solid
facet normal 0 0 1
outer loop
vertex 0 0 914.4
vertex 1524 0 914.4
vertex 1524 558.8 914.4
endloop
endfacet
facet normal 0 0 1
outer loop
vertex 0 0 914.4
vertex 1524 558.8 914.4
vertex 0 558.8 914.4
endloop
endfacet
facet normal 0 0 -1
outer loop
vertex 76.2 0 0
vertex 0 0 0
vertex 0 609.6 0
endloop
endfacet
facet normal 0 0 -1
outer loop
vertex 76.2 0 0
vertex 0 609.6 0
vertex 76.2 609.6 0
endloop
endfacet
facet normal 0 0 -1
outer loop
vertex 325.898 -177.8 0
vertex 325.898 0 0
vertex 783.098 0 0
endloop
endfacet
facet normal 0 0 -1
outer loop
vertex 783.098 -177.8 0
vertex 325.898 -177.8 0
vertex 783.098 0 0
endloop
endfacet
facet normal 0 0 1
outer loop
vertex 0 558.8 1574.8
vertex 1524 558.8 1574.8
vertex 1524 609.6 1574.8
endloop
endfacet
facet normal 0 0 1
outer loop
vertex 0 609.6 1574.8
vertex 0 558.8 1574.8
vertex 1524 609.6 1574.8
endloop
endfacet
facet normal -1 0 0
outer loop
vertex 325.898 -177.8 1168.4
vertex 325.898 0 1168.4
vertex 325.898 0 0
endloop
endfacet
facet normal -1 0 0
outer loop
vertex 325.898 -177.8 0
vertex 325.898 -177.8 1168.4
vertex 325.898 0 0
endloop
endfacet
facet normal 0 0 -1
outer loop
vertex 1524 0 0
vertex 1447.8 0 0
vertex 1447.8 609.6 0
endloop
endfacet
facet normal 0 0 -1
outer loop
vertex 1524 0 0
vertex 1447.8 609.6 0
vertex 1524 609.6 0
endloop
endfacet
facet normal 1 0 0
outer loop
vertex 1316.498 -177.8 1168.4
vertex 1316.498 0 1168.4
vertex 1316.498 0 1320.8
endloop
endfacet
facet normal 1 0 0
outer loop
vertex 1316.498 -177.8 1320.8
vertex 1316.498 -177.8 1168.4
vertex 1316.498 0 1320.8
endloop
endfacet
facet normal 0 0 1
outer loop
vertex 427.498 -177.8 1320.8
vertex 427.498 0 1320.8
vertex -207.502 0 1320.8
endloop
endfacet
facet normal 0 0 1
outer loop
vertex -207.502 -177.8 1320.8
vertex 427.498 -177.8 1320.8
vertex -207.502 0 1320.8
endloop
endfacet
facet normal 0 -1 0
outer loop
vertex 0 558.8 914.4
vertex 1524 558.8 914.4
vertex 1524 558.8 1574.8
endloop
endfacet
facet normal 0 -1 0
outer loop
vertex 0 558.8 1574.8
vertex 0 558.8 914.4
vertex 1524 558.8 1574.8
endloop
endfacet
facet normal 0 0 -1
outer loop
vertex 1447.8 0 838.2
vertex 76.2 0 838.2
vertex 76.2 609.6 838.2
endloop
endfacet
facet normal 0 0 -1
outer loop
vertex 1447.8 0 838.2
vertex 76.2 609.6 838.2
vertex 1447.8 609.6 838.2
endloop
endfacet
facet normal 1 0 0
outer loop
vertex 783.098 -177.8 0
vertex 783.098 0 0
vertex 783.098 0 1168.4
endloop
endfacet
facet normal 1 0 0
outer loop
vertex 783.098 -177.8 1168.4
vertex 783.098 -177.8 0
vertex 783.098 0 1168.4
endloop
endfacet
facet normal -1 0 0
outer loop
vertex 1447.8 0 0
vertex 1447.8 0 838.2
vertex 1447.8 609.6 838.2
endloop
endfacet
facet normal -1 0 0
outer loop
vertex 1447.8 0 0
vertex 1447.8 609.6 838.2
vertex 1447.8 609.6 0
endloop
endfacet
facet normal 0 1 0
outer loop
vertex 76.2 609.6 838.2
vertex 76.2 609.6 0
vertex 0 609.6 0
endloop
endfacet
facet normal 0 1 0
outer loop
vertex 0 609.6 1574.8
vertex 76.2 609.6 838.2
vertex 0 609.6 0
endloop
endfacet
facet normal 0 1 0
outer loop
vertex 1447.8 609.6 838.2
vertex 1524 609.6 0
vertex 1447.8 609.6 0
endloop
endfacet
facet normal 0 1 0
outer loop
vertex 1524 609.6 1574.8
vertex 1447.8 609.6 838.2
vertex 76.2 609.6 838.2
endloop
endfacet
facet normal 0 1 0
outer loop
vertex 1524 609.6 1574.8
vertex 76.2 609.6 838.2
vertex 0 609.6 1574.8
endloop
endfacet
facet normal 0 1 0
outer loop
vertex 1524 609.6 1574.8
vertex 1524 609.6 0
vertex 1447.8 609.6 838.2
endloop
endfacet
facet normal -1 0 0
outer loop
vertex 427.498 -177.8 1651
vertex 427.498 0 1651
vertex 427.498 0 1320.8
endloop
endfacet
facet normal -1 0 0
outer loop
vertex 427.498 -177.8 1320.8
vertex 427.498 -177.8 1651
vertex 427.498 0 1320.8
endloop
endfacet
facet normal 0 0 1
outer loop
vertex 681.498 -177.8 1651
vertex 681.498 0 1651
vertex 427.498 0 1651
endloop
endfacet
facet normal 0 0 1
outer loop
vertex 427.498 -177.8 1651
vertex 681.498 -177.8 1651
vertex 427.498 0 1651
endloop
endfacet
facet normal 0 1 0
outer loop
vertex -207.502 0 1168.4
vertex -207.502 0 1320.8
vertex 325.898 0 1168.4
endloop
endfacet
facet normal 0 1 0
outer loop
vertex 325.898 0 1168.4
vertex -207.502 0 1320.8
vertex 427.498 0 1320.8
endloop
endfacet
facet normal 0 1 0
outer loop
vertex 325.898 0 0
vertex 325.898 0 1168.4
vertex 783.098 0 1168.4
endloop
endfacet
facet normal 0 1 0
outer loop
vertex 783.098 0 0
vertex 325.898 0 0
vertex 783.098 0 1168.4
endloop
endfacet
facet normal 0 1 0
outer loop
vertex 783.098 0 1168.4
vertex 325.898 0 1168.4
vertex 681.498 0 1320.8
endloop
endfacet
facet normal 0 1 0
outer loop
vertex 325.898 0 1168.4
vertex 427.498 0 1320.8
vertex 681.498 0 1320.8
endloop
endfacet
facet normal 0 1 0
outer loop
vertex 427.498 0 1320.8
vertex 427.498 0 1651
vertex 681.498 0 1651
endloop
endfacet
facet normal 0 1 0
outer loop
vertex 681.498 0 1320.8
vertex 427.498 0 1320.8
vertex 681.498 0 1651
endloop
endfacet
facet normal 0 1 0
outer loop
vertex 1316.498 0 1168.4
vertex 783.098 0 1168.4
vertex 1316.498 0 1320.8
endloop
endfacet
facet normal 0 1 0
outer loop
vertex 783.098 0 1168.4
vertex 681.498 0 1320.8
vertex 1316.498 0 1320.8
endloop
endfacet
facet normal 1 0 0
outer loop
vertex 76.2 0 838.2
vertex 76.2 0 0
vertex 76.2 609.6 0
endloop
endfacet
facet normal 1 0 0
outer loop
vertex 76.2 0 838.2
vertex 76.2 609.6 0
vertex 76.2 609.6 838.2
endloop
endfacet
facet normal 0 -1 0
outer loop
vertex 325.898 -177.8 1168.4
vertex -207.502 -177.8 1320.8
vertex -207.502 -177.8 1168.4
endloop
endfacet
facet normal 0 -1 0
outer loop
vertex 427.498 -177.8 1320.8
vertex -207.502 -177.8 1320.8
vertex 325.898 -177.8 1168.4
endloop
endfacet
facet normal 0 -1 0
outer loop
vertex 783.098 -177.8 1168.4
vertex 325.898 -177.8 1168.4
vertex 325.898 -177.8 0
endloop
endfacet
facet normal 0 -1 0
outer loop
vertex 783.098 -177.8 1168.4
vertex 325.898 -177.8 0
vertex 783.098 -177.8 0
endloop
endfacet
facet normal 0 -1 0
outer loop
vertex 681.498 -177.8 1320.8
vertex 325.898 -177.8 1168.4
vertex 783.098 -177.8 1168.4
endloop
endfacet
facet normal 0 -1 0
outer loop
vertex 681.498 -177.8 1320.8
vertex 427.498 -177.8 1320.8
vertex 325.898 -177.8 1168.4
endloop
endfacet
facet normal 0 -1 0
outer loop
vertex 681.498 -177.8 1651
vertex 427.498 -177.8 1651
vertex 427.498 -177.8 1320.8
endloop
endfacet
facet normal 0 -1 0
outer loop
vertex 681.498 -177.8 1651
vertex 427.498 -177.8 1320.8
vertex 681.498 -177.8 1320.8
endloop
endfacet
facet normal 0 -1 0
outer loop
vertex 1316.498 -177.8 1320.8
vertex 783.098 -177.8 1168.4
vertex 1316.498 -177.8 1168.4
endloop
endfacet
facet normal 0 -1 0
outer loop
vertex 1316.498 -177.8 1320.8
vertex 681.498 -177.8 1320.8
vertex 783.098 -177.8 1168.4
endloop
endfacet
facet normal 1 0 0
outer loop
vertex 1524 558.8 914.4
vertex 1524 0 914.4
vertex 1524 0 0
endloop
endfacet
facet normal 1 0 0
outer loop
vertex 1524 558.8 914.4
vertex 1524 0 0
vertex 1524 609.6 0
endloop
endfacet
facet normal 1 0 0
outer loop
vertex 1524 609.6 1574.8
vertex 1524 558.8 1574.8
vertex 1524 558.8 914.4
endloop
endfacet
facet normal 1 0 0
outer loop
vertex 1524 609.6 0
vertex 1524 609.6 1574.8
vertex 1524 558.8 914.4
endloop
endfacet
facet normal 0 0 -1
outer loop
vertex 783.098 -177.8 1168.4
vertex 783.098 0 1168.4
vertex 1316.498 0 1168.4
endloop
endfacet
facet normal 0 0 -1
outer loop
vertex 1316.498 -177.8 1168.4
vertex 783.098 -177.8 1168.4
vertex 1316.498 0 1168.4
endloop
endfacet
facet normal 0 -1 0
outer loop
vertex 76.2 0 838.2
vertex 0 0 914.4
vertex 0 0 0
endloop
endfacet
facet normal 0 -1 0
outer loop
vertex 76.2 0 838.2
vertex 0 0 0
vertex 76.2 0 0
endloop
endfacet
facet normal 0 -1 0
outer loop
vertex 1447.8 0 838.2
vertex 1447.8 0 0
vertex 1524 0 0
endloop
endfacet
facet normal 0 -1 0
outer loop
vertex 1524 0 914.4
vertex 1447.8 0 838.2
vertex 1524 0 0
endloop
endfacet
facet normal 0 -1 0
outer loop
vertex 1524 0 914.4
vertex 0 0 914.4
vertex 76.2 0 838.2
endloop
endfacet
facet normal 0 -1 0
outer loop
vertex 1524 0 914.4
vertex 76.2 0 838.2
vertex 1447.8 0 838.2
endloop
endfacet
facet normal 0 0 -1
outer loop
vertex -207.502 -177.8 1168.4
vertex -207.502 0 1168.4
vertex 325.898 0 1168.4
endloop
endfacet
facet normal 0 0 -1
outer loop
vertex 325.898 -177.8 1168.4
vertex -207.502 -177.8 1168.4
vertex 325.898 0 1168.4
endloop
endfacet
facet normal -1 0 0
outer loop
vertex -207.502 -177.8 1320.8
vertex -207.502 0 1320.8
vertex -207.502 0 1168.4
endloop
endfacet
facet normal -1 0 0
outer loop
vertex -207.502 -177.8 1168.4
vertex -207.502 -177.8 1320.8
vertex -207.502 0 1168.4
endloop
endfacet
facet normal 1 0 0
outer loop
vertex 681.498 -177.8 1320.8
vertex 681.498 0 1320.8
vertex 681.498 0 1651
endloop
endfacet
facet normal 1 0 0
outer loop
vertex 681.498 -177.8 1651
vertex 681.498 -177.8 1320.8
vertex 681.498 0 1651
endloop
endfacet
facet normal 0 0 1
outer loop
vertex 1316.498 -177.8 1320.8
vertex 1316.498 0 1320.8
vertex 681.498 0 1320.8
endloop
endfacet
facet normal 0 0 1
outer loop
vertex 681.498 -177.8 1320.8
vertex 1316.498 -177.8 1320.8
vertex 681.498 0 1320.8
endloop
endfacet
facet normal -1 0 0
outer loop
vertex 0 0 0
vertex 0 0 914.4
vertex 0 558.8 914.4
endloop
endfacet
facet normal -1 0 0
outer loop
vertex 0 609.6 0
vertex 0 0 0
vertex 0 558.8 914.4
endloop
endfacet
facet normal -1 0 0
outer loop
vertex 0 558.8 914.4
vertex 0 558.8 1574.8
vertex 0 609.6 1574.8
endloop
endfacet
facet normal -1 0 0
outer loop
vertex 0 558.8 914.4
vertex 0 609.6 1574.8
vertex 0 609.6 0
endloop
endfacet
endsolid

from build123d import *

# Parameters (mm, degrees)
F1_DEPTH = 609.6
F2_W     = 50.8
F2_H     = 660.4
F3_DEPTH = 1524
F5_DEPTH = 177.8


with BuildPart() as f1:
    # F0 (on Front) → F1 (new body)
    with BuildSketch(Plane.XZ):
        Polygon((0, 914.4), (0, 0), (76.2, 0), (76.2, 838.2), (1447.8, 838.2), (1447.8, 0), (1524, 0), (1524, 914.4), align=None)
    extrude(amount=-F1_DEPTH)

    # F2 (on face) → F3 (join, through all)
    with BuildSketch(Plane.YZ.offset(1524)):
        with Locations((584.2, 1244.6)):
            Rectangle(F2_W, F2_H)
    extrude(amount=-F3_DEPTH)


with BuildPart() as f5:
    # F4 (on Front) → F5 (new body)
    with BuildSketch(Plane.XZ):
        Polygon((325.897723, 1168.4), (325.897723, 0), (783.097723, 0), (783.097723, 1168.4), (1316.497723, 1168.4), (1316.497723, 1320.8), (681.497723, 1320.8), (681.497723, 1651), (427.497723, 1651), (427.497723, 1320.8), (-207.502277, 1320.8), (-207.502277, 1168.4), align=None)
    extrude(amount=F5_DEPTH)


solid = Compound([f1.part, f5.part])
